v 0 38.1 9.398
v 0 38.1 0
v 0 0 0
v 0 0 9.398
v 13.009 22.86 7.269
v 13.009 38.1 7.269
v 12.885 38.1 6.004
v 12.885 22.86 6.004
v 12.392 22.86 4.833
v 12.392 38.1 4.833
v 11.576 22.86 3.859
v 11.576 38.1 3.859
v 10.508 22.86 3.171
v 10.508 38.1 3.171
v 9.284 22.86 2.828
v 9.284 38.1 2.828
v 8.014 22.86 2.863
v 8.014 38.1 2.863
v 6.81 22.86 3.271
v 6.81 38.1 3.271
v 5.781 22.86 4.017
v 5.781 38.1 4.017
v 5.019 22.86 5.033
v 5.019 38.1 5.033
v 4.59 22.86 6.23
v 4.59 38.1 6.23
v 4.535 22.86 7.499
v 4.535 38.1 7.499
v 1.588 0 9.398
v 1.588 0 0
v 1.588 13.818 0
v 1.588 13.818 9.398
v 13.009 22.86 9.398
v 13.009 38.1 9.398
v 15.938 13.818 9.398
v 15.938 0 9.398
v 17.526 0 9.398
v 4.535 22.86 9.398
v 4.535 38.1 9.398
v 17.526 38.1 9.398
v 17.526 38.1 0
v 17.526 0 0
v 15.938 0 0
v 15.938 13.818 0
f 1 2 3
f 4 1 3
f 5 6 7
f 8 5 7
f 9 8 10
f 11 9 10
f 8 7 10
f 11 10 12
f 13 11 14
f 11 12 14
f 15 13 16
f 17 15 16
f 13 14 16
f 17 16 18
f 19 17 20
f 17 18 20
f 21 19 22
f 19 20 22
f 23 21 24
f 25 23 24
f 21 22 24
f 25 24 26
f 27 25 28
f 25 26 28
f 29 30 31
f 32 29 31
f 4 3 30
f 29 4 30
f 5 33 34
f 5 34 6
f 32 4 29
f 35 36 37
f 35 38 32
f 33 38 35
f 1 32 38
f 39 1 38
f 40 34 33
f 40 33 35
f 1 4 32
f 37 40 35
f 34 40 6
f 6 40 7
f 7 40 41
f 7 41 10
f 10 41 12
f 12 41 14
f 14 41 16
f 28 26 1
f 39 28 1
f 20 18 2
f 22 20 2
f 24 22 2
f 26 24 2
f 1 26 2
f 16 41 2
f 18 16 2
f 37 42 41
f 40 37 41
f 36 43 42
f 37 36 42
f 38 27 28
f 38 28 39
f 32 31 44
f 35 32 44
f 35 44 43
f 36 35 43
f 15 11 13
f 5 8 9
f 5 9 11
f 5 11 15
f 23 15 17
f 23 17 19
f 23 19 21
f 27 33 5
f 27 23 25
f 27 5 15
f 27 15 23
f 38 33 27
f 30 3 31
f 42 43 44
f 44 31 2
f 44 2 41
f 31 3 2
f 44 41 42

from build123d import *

# Parameters (mm, degrees)
F1_DEPTH = 9.398
F3_DEPTH = 15.24


with BuildPart() as f1:
    # F0 (on Top) → F1 (new body)
    with BuildSketch(Plane.XY):
        Polygon((0, 38.1), (0, 0), (1.5875, 0), (1.5875, 13.8176), (15.9385, 13.8176), (15.9385, 0), (17.526, 0), (17.526, 38.1), align=None)
    extrude(amount=F1_DEPTH)

    # F2 (on face) → F3 (cut)
    with BuildSketch(Plane(origin=(0, 38.1, 0), x_dir=(-1, 0, 0), z_dir=(0, 1, 0))):
        with BuildLine():
            Line((-13.0094570703, 9.398), (-13.0094570703, 7.2687586724))
            ThreePointArc((-13.0094570703, 7.2687586724), (-8.647429717, 2.7979053307), (-4.5347851701, 7.4991782504))
            Line((-4.5347851701, 7.4991782504), (-4.5347851701, 9.398))
            Line((-4.5347851701, 9.398), (-13.0094570703, 9.398))
        make_face()
    extrude(amount=-F3_DEPTH, mode=Mode.SUBTRACT)


solid = f1.part
